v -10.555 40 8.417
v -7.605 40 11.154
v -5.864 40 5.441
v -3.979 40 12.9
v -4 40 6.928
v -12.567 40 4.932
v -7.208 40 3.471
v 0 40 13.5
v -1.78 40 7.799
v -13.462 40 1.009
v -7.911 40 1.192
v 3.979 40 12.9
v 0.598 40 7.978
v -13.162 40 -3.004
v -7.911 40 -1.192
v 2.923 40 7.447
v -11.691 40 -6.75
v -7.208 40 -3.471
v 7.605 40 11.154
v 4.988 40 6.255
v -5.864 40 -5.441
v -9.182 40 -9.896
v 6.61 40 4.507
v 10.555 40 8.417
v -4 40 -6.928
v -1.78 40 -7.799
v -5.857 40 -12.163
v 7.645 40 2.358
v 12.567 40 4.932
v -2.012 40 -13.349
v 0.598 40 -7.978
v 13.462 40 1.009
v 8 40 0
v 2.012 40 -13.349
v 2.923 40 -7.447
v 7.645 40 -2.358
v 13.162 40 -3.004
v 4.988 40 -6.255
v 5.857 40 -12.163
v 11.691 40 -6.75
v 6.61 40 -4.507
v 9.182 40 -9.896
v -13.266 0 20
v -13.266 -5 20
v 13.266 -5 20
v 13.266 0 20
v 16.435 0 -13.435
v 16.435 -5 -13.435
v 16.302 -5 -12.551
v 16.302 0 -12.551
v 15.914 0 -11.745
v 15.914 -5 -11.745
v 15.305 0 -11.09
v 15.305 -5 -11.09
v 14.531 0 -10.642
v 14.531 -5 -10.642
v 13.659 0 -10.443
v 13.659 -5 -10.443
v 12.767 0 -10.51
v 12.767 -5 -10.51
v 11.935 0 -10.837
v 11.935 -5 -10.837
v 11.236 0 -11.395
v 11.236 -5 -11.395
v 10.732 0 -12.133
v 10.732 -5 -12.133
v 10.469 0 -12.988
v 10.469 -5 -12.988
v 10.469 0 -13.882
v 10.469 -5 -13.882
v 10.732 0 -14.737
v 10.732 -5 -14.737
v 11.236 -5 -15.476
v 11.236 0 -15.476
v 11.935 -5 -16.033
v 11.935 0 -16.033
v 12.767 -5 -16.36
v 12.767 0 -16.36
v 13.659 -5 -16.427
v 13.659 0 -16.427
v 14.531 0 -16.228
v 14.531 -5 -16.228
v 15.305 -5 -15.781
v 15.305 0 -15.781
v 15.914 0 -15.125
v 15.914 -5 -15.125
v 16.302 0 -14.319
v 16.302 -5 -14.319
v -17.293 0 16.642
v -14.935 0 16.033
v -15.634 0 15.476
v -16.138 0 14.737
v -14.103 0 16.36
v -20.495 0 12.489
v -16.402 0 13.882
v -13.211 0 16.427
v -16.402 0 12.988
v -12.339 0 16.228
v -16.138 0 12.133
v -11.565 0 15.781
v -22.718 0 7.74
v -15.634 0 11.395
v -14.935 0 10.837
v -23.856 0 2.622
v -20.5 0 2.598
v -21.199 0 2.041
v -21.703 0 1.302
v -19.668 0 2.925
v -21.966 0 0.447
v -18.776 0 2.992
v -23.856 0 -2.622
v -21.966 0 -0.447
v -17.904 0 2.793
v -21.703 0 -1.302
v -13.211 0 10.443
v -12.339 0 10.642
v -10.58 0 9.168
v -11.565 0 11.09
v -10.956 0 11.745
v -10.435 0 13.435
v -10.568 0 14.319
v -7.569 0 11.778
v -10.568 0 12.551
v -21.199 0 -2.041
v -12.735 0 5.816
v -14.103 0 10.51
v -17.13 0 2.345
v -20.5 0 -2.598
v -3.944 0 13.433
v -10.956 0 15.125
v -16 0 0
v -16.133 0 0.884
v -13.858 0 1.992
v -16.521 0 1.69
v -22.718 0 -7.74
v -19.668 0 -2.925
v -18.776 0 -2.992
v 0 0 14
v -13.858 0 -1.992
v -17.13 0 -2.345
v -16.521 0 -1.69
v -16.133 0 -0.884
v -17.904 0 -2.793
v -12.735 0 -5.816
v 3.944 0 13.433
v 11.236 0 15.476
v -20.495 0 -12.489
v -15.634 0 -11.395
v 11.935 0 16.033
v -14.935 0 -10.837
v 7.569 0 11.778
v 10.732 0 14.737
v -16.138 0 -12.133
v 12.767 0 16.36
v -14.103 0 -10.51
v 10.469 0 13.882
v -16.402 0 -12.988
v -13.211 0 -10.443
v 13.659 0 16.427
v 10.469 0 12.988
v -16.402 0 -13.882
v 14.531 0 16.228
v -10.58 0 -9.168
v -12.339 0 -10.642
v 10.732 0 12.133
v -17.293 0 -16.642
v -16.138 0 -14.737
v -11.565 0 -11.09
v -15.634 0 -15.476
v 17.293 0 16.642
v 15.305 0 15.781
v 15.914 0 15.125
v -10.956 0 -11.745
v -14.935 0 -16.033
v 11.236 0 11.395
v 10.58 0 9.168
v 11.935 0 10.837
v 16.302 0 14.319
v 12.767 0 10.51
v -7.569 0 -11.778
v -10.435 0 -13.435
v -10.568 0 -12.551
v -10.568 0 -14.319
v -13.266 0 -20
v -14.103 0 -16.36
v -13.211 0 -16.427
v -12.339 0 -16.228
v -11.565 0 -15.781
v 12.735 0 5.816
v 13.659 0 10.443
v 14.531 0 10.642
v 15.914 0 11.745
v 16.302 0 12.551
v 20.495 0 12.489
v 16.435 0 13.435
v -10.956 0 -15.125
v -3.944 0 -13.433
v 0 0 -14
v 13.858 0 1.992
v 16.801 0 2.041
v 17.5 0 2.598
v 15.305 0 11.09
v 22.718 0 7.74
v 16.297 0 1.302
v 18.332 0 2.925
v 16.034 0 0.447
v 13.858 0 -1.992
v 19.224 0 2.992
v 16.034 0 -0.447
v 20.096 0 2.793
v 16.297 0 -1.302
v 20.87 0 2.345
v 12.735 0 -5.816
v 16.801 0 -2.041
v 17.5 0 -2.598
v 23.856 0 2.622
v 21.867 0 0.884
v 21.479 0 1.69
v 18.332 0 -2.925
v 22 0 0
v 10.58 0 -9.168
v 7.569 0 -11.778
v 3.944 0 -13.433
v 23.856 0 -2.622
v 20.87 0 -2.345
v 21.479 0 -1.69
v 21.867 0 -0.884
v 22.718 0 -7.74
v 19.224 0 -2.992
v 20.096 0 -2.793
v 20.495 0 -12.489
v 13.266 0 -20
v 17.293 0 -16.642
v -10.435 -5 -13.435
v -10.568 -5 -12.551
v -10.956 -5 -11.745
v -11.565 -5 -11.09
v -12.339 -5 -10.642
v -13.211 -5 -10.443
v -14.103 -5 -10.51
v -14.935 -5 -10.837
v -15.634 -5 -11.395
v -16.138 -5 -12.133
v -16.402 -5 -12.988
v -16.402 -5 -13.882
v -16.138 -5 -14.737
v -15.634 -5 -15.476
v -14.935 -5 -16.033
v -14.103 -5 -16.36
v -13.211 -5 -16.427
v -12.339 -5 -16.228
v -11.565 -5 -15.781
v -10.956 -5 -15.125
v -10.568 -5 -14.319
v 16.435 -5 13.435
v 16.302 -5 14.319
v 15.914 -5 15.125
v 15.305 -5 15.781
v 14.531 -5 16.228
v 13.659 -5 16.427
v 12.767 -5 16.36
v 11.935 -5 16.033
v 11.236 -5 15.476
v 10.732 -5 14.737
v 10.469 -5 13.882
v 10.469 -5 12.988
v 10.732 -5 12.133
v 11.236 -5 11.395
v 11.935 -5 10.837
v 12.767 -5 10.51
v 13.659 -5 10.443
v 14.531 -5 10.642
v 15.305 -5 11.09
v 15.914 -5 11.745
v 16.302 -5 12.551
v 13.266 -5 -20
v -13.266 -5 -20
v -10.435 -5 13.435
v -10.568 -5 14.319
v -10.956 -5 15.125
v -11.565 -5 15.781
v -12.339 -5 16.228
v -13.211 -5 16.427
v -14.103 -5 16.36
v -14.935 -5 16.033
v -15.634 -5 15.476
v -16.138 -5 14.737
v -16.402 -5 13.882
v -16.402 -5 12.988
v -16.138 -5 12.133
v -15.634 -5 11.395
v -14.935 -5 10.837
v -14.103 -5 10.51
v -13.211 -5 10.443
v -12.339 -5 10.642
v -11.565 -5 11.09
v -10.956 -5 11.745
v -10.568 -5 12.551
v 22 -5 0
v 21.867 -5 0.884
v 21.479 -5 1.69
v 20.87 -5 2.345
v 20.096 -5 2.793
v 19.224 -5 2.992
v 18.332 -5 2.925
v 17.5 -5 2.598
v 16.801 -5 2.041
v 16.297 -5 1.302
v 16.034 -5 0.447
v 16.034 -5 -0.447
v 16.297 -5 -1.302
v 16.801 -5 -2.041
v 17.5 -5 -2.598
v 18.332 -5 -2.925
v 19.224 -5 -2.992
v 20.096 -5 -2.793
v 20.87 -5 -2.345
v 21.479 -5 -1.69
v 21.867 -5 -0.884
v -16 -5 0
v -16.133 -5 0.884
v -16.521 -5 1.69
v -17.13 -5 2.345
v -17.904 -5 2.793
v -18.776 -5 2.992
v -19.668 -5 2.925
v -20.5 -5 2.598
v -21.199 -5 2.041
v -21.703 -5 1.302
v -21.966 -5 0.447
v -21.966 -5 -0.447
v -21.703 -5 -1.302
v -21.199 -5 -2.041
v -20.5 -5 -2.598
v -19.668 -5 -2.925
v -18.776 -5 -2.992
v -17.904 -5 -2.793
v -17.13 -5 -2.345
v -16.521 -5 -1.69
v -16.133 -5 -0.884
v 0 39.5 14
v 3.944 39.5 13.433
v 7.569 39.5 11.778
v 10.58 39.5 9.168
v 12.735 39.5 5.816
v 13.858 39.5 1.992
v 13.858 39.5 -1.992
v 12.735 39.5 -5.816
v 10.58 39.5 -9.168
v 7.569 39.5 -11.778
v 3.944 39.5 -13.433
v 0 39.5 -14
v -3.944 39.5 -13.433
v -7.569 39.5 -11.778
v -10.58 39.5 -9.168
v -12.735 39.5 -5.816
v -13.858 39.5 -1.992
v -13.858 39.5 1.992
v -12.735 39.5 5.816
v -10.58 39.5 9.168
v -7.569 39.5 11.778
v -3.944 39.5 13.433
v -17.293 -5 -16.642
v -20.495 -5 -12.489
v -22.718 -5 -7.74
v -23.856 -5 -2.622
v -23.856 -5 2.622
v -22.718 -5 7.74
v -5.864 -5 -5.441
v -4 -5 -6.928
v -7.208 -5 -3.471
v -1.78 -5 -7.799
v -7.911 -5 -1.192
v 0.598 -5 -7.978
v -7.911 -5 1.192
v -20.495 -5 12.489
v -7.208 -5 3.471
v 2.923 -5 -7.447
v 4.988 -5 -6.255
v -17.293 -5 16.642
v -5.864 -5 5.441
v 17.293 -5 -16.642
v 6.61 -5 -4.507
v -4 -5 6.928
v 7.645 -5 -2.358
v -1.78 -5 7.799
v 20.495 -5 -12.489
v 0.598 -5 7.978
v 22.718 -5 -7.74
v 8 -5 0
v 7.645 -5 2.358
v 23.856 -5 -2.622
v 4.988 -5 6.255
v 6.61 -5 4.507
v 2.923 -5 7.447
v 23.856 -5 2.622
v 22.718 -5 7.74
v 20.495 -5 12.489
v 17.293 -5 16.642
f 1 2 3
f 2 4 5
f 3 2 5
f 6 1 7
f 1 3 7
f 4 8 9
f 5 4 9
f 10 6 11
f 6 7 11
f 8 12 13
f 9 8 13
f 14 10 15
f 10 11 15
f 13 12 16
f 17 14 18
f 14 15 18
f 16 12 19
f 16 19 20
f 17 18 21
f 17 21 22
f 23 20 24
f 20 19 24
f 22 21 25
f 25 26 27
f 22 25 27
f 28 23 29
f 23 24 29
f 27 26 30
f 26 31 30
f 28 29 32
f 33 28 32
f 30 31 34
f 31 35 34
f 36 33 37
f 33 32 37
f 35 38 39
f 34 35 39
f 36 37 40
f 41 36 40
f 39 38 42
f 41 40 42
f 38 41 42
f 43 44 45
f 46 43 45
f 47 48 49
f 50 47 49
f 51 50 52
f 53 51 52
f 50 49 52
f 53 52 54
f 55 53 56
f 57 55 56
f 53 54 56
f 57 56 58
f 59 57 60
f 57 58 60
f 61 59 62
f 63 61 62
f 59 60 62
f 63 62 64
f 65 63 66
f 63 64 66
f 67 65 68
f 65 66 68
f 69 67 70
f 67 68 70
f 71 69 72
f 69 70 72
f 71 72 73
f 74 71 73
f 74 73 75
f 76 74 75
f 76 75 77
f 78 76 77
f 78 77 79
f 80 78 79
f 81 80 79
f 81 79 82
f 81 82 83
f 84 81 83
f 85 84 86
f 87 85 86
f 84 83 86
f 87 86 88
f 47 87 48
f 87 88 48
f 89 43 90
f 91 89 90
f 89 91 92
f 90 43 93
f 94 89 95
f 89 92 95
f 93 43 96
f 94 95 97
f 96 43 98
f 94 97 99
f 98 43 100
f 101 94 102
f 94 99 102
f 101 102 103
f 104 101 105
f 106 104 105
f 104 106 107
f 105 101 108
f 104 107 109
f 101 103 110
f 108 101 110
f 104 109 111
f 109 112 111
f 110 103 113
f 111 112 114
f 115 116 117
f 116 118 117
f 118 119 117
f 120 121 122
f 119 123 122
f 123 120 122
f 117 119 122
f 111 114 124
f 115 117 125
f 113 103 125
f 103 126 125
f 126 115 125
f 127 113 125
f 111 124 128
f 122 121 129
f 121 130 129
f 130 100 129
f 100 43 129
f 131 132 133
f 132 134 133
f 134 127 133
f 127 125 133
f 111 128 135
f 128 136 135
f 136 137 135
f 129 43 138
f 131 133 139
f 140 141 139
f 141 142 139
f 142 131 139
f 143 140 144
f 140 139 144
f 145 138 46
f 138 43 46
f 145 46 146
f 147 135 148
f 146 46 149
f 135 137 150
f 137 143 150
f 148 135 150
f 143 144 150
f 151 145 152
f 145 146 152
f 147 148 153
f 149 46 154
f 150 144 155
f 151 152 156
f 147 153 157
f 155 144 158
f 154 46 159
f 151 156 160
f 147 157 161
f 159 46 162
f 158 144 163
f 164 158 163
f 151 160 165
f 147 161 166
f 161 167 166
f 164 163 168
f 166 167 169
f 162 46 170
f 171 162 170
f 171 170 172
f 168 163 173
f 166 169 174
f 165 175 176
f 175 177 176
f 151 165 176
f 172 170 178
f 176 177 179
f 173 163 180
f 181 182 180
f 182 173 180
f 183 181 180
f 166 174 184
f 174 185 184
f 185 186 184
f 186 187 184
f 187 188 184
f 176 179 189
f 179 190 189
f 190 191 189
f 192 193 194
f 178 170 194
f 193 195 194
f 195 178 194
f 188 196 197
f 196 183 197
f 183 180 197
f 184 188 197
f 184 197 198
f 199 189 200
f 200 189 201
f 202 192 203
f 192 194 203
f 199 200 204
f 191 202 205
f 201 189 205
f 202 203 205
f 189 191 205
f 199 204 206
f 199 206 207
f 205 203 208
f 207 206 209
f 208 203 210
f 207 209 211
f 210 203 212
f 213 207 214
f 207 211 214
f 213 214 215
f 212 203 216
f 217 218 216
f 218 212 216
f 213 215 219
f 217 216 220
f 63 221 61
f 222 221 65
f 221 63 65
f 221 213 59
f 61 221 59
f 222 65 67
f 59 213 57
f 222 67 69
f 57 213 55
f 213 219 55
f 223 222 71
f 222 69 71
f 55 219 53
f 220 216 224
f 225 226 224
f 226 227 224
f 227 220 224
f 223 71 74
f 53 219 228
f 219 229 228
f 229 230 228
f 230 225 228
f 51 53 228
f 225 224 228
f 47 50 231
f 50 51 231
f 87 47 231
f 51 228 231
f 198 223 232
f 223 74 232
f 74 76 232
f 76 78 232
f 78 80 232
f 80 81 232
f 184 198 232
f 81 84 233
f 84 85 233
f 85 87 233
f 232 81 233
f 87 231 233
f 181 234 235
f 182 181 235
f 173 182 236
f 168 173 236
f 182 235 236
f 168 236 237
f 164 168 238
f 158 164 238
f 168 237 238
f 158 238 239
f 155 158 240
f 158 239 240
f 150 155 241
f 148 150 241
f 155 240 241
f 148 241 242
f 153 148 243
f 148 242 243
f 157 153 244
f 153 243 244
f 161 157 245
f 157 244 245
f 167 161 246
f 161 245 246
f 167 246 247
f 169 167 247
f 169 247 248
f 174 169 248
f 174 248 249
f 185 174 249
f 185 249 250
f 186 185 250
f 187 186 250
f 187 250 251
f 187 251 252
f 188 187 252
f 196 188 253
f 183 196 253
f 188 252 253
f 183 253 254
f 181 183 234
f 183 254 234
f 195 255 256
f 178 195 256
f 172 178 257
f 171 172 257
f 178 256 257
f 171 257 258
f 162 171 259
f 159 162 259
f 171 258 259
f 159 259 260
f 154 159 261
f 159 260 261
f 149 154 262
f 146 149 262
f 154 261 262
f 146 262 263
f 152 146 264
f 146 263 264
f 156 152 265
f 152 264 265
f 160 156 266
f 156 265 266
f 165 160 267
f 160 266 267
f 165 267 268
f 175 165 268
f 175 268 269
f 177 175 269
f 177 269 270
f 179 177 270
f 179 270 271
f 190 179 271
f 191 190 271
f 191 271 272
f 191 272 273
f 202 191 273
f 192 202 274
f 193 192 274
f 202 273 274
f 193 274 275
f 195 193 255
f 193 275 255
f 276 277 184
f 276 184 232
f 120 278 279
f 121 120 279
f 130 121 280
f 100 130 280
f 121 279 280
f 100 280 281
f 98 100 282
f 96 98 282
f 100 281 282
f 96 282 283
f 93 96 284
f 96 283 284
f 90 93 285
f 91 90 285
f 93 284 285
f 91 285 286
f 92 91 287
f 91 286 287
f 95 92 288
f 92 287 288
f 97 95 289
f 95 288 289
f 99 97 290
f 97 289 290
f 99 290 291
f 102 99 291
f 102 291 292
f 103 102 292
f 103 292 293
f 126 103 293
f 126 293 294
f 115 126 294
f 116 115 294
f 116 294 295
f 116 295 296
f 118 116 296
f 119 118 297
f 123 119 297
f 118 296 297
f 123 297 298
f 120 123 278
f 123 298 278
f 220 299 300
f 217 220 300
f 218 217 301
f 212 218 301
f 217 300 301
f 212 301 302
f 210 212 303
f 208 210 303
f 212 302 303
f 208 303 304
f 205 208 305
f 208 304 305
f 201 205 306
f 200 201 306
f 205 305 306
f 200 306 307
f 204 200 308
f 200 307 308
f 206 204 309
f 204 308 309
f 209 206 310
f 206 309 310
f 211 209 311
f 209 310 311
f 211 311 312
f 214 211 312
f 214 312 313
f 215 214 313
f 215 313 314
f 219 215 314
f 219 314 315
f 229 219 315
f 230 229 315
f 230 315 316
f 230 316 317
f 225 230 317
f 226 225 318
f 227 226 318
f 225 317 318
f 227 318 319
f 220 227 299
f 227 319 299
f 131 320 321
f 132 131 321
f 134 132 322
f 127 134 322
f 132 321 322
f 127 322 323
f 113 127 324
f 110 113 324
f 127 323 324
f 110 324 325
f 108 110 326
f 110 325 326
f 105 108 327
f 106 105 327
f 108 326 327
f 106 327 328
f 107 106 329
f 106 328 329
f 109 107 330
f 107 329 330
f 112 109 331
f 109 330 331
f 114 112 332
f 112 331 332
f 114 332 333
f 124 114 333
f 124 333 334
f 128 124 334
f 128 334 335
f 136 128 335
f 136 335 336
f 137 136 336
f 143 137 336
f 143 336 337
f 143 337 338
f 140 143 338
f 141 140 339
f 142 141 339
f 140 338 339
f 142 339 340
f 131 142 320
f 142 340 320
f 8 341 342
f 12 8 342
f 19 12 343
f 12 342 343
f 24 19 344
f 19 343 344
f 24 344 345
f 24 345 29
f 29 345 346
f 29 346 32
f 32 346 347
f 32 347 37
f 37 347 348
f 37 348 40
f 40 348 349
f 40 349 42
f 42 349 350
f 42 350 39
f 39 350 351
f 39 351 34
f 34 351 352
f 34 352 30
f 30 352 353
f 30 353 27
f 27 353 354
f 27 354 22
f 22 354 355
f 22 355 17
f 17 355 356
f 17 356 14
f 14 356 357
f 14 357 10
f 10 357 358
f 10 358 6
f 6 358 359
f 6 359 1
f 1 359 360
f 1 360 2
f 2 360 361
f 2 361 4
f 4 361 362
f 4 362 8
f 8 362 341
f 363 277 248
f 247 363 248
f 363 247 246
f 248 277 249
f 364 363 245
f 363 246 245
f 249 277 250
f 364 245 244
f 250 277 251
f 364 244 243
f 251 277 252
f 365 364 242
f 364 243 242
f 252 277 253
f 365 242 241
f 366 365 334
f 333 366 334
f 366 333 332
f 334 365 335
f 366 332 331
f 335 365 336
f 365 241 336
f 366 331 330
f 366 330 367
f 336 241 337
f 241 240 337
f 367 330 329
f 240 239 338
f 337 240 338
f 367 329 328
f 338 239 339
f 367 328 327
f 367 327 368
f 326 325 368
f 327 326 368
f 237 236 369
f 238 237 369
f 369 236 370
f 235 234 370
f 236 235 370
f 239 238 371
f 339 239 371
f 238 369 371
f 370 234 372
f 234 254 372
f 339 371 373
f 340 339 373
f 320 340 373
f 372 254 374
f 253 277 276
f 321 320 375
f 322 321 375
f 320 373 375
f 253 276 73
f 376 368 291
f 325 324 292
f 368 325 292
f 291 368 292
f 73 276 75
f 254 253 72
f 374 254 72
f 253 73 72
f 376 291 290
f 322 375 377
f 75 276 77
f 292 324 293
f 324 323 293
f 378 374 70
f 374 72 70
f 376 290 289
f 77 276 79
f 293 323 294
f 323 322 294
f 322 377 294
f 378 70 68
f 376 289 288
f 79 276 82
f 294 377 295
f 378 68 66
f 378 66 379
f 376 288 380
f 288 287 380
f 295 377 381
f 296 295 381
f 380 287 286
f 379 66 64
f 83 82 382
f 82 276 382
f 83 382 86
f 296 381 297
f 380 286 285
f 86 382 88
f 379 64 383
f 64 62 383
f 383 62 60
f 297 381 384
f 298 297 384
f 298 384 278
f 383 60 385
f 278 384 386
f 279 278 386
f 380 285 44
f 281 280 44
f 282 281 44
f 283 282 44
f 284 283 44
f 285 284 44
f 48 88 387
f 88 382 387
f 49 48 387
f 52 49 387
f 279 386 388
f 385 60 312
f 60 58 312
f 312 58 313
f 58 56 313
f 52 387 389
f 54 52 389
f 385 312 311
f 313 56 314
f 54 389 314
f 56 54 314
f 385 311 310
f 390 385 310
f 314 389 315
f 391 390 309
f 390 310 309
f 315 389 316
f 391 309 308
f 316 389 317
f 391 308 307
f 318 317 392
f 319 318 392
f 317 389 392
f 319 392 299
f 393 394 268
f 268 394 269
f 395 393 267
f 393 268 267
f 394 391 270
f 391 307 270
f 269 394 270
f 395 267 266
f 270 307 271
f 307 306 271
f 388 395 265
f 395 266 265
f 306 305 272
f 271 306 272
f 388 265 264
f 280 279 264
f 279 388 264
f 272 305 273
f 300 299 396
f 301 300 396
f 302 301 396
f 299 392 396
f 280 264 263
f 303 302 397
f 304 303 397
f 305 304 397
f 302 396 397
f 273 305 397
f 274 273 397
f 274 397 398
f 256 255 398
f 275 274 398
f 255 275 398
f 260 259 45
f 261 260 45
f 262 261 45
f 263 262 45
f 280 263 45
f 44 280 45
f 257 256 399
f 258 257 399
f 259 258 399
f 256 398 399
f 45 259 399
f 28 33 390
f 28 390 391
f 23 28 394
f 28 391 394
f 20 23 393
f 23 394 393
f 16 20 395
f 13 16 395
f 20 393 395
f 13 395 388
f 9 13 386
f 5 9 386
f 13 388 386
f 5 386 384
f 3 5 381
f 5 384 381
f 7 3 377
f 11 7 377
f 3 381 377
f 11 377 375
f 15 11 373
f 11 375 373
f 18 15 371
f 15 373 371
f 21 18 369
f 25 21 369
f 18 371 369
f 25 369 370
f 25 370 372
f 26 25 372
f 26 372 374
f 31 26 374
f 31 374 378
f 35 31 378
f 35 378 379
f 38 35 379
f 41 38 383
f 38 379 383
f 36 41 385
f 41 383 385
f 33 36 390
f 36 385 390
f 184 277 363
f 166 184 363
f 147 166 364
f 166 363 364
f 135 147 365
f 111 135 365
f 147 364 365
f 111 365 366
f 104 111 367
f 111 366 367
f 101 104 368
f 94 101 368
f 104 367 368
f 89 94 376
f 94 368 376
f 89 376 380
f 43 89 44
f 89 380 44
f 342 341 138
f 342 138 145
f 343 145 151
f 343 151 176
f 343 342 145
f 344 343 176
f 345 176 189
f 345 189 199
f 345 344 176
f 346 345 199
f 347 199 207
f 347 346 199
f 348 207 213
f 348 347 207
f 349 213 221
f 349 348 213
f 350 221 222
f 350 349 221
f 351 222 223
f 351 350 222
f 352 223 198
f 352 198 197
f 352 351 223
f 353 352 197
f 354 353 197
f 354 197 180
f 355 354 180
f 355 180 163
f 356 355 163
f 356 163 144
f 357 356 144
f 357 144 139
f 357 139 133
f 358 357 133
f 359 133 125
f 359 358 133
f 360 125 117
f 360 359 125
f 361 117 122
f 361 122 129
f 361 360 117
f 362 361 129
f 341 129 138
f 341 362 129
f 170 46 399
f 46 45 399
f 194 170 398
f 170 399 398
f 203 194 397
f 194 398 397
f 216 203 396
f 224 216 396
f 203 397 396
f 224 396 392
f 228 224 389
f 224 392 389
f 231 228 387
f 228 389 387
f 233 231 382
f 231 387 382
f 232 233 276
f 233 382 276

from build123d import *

# Parameters (mm, degrees)
F0_W     = 40
F0_H     = 14
F2_W     = 26.532998
F2_H     = 7.604173
F2_H_2   = 9.77986
F3_DEPTH = 5
F4_R     = 8
F5_DEPTH = 45
F6_R     = 3
F7_DEPTH = 5
F8_SIZE  = 0.5


with BuildPart() as f1:
    # F0 (on Right) → F1 (revolve)
    with BuildSketch(Plane.YZ):
        with Locations((20, 7)):
            Rectangle(F0_W, F0_H)
        Polygon((-5, 0), (0, 0), (0, 14), (0, 24), (-5, 24), align=None)
    revolve(axis=Axis((0, 20, 0), (0, 1, 0)))

    # F2 (on face) → F3 (cut)
    with BuildSketch(Plane.XZ.offset(5)):
        with Locations((0, 23.802087)):
            Rectangle(F2_W, F2_H)
        with Locations((0, -24.88993)):
            Rectangle(F2_W, F2_H_2)
    extrude(amount=-F3_DEPTH, mode=Mode.SUBTRACT)

    # F4 (on face) → F5 (cut)
    with BuildSketch(Plane.XZ.offset(5)):
        Circle(F4_R)
    extrude(amount=-F5_DEPTH, mode=Mode.SUBTRACT)

    # F6 (on face) → F7 (cut)
    with BuildSketch(Plane.XZ.offset(5)):
        with Locations((-13.435029, 13.435029)):
            Circle(F6_R)
        with Locations((13.435029, 13.435029)):
            Circle(F6_R)
        with Locations((13.435029, -13.435029)):
            Circle(F6_R)
        with Locations((-13.435029, -13.435029)):
            Circle(F6_R)
        with Locations((-19, 0)):
            Circle(F6_R)
        with Locations((19, 0)):
            Circle(F6_R)
    extrude(amount=-F7_DEPTH, mode=Mode.SUBTRACT)

    # F8
    f8_edges = [f1.edges().sort_by_distance(p)[0] for p in [
        (0, 40, -14),
    ]]
    chamfer(f8_edges, length=F8_SIZE)


solid = f1.part
